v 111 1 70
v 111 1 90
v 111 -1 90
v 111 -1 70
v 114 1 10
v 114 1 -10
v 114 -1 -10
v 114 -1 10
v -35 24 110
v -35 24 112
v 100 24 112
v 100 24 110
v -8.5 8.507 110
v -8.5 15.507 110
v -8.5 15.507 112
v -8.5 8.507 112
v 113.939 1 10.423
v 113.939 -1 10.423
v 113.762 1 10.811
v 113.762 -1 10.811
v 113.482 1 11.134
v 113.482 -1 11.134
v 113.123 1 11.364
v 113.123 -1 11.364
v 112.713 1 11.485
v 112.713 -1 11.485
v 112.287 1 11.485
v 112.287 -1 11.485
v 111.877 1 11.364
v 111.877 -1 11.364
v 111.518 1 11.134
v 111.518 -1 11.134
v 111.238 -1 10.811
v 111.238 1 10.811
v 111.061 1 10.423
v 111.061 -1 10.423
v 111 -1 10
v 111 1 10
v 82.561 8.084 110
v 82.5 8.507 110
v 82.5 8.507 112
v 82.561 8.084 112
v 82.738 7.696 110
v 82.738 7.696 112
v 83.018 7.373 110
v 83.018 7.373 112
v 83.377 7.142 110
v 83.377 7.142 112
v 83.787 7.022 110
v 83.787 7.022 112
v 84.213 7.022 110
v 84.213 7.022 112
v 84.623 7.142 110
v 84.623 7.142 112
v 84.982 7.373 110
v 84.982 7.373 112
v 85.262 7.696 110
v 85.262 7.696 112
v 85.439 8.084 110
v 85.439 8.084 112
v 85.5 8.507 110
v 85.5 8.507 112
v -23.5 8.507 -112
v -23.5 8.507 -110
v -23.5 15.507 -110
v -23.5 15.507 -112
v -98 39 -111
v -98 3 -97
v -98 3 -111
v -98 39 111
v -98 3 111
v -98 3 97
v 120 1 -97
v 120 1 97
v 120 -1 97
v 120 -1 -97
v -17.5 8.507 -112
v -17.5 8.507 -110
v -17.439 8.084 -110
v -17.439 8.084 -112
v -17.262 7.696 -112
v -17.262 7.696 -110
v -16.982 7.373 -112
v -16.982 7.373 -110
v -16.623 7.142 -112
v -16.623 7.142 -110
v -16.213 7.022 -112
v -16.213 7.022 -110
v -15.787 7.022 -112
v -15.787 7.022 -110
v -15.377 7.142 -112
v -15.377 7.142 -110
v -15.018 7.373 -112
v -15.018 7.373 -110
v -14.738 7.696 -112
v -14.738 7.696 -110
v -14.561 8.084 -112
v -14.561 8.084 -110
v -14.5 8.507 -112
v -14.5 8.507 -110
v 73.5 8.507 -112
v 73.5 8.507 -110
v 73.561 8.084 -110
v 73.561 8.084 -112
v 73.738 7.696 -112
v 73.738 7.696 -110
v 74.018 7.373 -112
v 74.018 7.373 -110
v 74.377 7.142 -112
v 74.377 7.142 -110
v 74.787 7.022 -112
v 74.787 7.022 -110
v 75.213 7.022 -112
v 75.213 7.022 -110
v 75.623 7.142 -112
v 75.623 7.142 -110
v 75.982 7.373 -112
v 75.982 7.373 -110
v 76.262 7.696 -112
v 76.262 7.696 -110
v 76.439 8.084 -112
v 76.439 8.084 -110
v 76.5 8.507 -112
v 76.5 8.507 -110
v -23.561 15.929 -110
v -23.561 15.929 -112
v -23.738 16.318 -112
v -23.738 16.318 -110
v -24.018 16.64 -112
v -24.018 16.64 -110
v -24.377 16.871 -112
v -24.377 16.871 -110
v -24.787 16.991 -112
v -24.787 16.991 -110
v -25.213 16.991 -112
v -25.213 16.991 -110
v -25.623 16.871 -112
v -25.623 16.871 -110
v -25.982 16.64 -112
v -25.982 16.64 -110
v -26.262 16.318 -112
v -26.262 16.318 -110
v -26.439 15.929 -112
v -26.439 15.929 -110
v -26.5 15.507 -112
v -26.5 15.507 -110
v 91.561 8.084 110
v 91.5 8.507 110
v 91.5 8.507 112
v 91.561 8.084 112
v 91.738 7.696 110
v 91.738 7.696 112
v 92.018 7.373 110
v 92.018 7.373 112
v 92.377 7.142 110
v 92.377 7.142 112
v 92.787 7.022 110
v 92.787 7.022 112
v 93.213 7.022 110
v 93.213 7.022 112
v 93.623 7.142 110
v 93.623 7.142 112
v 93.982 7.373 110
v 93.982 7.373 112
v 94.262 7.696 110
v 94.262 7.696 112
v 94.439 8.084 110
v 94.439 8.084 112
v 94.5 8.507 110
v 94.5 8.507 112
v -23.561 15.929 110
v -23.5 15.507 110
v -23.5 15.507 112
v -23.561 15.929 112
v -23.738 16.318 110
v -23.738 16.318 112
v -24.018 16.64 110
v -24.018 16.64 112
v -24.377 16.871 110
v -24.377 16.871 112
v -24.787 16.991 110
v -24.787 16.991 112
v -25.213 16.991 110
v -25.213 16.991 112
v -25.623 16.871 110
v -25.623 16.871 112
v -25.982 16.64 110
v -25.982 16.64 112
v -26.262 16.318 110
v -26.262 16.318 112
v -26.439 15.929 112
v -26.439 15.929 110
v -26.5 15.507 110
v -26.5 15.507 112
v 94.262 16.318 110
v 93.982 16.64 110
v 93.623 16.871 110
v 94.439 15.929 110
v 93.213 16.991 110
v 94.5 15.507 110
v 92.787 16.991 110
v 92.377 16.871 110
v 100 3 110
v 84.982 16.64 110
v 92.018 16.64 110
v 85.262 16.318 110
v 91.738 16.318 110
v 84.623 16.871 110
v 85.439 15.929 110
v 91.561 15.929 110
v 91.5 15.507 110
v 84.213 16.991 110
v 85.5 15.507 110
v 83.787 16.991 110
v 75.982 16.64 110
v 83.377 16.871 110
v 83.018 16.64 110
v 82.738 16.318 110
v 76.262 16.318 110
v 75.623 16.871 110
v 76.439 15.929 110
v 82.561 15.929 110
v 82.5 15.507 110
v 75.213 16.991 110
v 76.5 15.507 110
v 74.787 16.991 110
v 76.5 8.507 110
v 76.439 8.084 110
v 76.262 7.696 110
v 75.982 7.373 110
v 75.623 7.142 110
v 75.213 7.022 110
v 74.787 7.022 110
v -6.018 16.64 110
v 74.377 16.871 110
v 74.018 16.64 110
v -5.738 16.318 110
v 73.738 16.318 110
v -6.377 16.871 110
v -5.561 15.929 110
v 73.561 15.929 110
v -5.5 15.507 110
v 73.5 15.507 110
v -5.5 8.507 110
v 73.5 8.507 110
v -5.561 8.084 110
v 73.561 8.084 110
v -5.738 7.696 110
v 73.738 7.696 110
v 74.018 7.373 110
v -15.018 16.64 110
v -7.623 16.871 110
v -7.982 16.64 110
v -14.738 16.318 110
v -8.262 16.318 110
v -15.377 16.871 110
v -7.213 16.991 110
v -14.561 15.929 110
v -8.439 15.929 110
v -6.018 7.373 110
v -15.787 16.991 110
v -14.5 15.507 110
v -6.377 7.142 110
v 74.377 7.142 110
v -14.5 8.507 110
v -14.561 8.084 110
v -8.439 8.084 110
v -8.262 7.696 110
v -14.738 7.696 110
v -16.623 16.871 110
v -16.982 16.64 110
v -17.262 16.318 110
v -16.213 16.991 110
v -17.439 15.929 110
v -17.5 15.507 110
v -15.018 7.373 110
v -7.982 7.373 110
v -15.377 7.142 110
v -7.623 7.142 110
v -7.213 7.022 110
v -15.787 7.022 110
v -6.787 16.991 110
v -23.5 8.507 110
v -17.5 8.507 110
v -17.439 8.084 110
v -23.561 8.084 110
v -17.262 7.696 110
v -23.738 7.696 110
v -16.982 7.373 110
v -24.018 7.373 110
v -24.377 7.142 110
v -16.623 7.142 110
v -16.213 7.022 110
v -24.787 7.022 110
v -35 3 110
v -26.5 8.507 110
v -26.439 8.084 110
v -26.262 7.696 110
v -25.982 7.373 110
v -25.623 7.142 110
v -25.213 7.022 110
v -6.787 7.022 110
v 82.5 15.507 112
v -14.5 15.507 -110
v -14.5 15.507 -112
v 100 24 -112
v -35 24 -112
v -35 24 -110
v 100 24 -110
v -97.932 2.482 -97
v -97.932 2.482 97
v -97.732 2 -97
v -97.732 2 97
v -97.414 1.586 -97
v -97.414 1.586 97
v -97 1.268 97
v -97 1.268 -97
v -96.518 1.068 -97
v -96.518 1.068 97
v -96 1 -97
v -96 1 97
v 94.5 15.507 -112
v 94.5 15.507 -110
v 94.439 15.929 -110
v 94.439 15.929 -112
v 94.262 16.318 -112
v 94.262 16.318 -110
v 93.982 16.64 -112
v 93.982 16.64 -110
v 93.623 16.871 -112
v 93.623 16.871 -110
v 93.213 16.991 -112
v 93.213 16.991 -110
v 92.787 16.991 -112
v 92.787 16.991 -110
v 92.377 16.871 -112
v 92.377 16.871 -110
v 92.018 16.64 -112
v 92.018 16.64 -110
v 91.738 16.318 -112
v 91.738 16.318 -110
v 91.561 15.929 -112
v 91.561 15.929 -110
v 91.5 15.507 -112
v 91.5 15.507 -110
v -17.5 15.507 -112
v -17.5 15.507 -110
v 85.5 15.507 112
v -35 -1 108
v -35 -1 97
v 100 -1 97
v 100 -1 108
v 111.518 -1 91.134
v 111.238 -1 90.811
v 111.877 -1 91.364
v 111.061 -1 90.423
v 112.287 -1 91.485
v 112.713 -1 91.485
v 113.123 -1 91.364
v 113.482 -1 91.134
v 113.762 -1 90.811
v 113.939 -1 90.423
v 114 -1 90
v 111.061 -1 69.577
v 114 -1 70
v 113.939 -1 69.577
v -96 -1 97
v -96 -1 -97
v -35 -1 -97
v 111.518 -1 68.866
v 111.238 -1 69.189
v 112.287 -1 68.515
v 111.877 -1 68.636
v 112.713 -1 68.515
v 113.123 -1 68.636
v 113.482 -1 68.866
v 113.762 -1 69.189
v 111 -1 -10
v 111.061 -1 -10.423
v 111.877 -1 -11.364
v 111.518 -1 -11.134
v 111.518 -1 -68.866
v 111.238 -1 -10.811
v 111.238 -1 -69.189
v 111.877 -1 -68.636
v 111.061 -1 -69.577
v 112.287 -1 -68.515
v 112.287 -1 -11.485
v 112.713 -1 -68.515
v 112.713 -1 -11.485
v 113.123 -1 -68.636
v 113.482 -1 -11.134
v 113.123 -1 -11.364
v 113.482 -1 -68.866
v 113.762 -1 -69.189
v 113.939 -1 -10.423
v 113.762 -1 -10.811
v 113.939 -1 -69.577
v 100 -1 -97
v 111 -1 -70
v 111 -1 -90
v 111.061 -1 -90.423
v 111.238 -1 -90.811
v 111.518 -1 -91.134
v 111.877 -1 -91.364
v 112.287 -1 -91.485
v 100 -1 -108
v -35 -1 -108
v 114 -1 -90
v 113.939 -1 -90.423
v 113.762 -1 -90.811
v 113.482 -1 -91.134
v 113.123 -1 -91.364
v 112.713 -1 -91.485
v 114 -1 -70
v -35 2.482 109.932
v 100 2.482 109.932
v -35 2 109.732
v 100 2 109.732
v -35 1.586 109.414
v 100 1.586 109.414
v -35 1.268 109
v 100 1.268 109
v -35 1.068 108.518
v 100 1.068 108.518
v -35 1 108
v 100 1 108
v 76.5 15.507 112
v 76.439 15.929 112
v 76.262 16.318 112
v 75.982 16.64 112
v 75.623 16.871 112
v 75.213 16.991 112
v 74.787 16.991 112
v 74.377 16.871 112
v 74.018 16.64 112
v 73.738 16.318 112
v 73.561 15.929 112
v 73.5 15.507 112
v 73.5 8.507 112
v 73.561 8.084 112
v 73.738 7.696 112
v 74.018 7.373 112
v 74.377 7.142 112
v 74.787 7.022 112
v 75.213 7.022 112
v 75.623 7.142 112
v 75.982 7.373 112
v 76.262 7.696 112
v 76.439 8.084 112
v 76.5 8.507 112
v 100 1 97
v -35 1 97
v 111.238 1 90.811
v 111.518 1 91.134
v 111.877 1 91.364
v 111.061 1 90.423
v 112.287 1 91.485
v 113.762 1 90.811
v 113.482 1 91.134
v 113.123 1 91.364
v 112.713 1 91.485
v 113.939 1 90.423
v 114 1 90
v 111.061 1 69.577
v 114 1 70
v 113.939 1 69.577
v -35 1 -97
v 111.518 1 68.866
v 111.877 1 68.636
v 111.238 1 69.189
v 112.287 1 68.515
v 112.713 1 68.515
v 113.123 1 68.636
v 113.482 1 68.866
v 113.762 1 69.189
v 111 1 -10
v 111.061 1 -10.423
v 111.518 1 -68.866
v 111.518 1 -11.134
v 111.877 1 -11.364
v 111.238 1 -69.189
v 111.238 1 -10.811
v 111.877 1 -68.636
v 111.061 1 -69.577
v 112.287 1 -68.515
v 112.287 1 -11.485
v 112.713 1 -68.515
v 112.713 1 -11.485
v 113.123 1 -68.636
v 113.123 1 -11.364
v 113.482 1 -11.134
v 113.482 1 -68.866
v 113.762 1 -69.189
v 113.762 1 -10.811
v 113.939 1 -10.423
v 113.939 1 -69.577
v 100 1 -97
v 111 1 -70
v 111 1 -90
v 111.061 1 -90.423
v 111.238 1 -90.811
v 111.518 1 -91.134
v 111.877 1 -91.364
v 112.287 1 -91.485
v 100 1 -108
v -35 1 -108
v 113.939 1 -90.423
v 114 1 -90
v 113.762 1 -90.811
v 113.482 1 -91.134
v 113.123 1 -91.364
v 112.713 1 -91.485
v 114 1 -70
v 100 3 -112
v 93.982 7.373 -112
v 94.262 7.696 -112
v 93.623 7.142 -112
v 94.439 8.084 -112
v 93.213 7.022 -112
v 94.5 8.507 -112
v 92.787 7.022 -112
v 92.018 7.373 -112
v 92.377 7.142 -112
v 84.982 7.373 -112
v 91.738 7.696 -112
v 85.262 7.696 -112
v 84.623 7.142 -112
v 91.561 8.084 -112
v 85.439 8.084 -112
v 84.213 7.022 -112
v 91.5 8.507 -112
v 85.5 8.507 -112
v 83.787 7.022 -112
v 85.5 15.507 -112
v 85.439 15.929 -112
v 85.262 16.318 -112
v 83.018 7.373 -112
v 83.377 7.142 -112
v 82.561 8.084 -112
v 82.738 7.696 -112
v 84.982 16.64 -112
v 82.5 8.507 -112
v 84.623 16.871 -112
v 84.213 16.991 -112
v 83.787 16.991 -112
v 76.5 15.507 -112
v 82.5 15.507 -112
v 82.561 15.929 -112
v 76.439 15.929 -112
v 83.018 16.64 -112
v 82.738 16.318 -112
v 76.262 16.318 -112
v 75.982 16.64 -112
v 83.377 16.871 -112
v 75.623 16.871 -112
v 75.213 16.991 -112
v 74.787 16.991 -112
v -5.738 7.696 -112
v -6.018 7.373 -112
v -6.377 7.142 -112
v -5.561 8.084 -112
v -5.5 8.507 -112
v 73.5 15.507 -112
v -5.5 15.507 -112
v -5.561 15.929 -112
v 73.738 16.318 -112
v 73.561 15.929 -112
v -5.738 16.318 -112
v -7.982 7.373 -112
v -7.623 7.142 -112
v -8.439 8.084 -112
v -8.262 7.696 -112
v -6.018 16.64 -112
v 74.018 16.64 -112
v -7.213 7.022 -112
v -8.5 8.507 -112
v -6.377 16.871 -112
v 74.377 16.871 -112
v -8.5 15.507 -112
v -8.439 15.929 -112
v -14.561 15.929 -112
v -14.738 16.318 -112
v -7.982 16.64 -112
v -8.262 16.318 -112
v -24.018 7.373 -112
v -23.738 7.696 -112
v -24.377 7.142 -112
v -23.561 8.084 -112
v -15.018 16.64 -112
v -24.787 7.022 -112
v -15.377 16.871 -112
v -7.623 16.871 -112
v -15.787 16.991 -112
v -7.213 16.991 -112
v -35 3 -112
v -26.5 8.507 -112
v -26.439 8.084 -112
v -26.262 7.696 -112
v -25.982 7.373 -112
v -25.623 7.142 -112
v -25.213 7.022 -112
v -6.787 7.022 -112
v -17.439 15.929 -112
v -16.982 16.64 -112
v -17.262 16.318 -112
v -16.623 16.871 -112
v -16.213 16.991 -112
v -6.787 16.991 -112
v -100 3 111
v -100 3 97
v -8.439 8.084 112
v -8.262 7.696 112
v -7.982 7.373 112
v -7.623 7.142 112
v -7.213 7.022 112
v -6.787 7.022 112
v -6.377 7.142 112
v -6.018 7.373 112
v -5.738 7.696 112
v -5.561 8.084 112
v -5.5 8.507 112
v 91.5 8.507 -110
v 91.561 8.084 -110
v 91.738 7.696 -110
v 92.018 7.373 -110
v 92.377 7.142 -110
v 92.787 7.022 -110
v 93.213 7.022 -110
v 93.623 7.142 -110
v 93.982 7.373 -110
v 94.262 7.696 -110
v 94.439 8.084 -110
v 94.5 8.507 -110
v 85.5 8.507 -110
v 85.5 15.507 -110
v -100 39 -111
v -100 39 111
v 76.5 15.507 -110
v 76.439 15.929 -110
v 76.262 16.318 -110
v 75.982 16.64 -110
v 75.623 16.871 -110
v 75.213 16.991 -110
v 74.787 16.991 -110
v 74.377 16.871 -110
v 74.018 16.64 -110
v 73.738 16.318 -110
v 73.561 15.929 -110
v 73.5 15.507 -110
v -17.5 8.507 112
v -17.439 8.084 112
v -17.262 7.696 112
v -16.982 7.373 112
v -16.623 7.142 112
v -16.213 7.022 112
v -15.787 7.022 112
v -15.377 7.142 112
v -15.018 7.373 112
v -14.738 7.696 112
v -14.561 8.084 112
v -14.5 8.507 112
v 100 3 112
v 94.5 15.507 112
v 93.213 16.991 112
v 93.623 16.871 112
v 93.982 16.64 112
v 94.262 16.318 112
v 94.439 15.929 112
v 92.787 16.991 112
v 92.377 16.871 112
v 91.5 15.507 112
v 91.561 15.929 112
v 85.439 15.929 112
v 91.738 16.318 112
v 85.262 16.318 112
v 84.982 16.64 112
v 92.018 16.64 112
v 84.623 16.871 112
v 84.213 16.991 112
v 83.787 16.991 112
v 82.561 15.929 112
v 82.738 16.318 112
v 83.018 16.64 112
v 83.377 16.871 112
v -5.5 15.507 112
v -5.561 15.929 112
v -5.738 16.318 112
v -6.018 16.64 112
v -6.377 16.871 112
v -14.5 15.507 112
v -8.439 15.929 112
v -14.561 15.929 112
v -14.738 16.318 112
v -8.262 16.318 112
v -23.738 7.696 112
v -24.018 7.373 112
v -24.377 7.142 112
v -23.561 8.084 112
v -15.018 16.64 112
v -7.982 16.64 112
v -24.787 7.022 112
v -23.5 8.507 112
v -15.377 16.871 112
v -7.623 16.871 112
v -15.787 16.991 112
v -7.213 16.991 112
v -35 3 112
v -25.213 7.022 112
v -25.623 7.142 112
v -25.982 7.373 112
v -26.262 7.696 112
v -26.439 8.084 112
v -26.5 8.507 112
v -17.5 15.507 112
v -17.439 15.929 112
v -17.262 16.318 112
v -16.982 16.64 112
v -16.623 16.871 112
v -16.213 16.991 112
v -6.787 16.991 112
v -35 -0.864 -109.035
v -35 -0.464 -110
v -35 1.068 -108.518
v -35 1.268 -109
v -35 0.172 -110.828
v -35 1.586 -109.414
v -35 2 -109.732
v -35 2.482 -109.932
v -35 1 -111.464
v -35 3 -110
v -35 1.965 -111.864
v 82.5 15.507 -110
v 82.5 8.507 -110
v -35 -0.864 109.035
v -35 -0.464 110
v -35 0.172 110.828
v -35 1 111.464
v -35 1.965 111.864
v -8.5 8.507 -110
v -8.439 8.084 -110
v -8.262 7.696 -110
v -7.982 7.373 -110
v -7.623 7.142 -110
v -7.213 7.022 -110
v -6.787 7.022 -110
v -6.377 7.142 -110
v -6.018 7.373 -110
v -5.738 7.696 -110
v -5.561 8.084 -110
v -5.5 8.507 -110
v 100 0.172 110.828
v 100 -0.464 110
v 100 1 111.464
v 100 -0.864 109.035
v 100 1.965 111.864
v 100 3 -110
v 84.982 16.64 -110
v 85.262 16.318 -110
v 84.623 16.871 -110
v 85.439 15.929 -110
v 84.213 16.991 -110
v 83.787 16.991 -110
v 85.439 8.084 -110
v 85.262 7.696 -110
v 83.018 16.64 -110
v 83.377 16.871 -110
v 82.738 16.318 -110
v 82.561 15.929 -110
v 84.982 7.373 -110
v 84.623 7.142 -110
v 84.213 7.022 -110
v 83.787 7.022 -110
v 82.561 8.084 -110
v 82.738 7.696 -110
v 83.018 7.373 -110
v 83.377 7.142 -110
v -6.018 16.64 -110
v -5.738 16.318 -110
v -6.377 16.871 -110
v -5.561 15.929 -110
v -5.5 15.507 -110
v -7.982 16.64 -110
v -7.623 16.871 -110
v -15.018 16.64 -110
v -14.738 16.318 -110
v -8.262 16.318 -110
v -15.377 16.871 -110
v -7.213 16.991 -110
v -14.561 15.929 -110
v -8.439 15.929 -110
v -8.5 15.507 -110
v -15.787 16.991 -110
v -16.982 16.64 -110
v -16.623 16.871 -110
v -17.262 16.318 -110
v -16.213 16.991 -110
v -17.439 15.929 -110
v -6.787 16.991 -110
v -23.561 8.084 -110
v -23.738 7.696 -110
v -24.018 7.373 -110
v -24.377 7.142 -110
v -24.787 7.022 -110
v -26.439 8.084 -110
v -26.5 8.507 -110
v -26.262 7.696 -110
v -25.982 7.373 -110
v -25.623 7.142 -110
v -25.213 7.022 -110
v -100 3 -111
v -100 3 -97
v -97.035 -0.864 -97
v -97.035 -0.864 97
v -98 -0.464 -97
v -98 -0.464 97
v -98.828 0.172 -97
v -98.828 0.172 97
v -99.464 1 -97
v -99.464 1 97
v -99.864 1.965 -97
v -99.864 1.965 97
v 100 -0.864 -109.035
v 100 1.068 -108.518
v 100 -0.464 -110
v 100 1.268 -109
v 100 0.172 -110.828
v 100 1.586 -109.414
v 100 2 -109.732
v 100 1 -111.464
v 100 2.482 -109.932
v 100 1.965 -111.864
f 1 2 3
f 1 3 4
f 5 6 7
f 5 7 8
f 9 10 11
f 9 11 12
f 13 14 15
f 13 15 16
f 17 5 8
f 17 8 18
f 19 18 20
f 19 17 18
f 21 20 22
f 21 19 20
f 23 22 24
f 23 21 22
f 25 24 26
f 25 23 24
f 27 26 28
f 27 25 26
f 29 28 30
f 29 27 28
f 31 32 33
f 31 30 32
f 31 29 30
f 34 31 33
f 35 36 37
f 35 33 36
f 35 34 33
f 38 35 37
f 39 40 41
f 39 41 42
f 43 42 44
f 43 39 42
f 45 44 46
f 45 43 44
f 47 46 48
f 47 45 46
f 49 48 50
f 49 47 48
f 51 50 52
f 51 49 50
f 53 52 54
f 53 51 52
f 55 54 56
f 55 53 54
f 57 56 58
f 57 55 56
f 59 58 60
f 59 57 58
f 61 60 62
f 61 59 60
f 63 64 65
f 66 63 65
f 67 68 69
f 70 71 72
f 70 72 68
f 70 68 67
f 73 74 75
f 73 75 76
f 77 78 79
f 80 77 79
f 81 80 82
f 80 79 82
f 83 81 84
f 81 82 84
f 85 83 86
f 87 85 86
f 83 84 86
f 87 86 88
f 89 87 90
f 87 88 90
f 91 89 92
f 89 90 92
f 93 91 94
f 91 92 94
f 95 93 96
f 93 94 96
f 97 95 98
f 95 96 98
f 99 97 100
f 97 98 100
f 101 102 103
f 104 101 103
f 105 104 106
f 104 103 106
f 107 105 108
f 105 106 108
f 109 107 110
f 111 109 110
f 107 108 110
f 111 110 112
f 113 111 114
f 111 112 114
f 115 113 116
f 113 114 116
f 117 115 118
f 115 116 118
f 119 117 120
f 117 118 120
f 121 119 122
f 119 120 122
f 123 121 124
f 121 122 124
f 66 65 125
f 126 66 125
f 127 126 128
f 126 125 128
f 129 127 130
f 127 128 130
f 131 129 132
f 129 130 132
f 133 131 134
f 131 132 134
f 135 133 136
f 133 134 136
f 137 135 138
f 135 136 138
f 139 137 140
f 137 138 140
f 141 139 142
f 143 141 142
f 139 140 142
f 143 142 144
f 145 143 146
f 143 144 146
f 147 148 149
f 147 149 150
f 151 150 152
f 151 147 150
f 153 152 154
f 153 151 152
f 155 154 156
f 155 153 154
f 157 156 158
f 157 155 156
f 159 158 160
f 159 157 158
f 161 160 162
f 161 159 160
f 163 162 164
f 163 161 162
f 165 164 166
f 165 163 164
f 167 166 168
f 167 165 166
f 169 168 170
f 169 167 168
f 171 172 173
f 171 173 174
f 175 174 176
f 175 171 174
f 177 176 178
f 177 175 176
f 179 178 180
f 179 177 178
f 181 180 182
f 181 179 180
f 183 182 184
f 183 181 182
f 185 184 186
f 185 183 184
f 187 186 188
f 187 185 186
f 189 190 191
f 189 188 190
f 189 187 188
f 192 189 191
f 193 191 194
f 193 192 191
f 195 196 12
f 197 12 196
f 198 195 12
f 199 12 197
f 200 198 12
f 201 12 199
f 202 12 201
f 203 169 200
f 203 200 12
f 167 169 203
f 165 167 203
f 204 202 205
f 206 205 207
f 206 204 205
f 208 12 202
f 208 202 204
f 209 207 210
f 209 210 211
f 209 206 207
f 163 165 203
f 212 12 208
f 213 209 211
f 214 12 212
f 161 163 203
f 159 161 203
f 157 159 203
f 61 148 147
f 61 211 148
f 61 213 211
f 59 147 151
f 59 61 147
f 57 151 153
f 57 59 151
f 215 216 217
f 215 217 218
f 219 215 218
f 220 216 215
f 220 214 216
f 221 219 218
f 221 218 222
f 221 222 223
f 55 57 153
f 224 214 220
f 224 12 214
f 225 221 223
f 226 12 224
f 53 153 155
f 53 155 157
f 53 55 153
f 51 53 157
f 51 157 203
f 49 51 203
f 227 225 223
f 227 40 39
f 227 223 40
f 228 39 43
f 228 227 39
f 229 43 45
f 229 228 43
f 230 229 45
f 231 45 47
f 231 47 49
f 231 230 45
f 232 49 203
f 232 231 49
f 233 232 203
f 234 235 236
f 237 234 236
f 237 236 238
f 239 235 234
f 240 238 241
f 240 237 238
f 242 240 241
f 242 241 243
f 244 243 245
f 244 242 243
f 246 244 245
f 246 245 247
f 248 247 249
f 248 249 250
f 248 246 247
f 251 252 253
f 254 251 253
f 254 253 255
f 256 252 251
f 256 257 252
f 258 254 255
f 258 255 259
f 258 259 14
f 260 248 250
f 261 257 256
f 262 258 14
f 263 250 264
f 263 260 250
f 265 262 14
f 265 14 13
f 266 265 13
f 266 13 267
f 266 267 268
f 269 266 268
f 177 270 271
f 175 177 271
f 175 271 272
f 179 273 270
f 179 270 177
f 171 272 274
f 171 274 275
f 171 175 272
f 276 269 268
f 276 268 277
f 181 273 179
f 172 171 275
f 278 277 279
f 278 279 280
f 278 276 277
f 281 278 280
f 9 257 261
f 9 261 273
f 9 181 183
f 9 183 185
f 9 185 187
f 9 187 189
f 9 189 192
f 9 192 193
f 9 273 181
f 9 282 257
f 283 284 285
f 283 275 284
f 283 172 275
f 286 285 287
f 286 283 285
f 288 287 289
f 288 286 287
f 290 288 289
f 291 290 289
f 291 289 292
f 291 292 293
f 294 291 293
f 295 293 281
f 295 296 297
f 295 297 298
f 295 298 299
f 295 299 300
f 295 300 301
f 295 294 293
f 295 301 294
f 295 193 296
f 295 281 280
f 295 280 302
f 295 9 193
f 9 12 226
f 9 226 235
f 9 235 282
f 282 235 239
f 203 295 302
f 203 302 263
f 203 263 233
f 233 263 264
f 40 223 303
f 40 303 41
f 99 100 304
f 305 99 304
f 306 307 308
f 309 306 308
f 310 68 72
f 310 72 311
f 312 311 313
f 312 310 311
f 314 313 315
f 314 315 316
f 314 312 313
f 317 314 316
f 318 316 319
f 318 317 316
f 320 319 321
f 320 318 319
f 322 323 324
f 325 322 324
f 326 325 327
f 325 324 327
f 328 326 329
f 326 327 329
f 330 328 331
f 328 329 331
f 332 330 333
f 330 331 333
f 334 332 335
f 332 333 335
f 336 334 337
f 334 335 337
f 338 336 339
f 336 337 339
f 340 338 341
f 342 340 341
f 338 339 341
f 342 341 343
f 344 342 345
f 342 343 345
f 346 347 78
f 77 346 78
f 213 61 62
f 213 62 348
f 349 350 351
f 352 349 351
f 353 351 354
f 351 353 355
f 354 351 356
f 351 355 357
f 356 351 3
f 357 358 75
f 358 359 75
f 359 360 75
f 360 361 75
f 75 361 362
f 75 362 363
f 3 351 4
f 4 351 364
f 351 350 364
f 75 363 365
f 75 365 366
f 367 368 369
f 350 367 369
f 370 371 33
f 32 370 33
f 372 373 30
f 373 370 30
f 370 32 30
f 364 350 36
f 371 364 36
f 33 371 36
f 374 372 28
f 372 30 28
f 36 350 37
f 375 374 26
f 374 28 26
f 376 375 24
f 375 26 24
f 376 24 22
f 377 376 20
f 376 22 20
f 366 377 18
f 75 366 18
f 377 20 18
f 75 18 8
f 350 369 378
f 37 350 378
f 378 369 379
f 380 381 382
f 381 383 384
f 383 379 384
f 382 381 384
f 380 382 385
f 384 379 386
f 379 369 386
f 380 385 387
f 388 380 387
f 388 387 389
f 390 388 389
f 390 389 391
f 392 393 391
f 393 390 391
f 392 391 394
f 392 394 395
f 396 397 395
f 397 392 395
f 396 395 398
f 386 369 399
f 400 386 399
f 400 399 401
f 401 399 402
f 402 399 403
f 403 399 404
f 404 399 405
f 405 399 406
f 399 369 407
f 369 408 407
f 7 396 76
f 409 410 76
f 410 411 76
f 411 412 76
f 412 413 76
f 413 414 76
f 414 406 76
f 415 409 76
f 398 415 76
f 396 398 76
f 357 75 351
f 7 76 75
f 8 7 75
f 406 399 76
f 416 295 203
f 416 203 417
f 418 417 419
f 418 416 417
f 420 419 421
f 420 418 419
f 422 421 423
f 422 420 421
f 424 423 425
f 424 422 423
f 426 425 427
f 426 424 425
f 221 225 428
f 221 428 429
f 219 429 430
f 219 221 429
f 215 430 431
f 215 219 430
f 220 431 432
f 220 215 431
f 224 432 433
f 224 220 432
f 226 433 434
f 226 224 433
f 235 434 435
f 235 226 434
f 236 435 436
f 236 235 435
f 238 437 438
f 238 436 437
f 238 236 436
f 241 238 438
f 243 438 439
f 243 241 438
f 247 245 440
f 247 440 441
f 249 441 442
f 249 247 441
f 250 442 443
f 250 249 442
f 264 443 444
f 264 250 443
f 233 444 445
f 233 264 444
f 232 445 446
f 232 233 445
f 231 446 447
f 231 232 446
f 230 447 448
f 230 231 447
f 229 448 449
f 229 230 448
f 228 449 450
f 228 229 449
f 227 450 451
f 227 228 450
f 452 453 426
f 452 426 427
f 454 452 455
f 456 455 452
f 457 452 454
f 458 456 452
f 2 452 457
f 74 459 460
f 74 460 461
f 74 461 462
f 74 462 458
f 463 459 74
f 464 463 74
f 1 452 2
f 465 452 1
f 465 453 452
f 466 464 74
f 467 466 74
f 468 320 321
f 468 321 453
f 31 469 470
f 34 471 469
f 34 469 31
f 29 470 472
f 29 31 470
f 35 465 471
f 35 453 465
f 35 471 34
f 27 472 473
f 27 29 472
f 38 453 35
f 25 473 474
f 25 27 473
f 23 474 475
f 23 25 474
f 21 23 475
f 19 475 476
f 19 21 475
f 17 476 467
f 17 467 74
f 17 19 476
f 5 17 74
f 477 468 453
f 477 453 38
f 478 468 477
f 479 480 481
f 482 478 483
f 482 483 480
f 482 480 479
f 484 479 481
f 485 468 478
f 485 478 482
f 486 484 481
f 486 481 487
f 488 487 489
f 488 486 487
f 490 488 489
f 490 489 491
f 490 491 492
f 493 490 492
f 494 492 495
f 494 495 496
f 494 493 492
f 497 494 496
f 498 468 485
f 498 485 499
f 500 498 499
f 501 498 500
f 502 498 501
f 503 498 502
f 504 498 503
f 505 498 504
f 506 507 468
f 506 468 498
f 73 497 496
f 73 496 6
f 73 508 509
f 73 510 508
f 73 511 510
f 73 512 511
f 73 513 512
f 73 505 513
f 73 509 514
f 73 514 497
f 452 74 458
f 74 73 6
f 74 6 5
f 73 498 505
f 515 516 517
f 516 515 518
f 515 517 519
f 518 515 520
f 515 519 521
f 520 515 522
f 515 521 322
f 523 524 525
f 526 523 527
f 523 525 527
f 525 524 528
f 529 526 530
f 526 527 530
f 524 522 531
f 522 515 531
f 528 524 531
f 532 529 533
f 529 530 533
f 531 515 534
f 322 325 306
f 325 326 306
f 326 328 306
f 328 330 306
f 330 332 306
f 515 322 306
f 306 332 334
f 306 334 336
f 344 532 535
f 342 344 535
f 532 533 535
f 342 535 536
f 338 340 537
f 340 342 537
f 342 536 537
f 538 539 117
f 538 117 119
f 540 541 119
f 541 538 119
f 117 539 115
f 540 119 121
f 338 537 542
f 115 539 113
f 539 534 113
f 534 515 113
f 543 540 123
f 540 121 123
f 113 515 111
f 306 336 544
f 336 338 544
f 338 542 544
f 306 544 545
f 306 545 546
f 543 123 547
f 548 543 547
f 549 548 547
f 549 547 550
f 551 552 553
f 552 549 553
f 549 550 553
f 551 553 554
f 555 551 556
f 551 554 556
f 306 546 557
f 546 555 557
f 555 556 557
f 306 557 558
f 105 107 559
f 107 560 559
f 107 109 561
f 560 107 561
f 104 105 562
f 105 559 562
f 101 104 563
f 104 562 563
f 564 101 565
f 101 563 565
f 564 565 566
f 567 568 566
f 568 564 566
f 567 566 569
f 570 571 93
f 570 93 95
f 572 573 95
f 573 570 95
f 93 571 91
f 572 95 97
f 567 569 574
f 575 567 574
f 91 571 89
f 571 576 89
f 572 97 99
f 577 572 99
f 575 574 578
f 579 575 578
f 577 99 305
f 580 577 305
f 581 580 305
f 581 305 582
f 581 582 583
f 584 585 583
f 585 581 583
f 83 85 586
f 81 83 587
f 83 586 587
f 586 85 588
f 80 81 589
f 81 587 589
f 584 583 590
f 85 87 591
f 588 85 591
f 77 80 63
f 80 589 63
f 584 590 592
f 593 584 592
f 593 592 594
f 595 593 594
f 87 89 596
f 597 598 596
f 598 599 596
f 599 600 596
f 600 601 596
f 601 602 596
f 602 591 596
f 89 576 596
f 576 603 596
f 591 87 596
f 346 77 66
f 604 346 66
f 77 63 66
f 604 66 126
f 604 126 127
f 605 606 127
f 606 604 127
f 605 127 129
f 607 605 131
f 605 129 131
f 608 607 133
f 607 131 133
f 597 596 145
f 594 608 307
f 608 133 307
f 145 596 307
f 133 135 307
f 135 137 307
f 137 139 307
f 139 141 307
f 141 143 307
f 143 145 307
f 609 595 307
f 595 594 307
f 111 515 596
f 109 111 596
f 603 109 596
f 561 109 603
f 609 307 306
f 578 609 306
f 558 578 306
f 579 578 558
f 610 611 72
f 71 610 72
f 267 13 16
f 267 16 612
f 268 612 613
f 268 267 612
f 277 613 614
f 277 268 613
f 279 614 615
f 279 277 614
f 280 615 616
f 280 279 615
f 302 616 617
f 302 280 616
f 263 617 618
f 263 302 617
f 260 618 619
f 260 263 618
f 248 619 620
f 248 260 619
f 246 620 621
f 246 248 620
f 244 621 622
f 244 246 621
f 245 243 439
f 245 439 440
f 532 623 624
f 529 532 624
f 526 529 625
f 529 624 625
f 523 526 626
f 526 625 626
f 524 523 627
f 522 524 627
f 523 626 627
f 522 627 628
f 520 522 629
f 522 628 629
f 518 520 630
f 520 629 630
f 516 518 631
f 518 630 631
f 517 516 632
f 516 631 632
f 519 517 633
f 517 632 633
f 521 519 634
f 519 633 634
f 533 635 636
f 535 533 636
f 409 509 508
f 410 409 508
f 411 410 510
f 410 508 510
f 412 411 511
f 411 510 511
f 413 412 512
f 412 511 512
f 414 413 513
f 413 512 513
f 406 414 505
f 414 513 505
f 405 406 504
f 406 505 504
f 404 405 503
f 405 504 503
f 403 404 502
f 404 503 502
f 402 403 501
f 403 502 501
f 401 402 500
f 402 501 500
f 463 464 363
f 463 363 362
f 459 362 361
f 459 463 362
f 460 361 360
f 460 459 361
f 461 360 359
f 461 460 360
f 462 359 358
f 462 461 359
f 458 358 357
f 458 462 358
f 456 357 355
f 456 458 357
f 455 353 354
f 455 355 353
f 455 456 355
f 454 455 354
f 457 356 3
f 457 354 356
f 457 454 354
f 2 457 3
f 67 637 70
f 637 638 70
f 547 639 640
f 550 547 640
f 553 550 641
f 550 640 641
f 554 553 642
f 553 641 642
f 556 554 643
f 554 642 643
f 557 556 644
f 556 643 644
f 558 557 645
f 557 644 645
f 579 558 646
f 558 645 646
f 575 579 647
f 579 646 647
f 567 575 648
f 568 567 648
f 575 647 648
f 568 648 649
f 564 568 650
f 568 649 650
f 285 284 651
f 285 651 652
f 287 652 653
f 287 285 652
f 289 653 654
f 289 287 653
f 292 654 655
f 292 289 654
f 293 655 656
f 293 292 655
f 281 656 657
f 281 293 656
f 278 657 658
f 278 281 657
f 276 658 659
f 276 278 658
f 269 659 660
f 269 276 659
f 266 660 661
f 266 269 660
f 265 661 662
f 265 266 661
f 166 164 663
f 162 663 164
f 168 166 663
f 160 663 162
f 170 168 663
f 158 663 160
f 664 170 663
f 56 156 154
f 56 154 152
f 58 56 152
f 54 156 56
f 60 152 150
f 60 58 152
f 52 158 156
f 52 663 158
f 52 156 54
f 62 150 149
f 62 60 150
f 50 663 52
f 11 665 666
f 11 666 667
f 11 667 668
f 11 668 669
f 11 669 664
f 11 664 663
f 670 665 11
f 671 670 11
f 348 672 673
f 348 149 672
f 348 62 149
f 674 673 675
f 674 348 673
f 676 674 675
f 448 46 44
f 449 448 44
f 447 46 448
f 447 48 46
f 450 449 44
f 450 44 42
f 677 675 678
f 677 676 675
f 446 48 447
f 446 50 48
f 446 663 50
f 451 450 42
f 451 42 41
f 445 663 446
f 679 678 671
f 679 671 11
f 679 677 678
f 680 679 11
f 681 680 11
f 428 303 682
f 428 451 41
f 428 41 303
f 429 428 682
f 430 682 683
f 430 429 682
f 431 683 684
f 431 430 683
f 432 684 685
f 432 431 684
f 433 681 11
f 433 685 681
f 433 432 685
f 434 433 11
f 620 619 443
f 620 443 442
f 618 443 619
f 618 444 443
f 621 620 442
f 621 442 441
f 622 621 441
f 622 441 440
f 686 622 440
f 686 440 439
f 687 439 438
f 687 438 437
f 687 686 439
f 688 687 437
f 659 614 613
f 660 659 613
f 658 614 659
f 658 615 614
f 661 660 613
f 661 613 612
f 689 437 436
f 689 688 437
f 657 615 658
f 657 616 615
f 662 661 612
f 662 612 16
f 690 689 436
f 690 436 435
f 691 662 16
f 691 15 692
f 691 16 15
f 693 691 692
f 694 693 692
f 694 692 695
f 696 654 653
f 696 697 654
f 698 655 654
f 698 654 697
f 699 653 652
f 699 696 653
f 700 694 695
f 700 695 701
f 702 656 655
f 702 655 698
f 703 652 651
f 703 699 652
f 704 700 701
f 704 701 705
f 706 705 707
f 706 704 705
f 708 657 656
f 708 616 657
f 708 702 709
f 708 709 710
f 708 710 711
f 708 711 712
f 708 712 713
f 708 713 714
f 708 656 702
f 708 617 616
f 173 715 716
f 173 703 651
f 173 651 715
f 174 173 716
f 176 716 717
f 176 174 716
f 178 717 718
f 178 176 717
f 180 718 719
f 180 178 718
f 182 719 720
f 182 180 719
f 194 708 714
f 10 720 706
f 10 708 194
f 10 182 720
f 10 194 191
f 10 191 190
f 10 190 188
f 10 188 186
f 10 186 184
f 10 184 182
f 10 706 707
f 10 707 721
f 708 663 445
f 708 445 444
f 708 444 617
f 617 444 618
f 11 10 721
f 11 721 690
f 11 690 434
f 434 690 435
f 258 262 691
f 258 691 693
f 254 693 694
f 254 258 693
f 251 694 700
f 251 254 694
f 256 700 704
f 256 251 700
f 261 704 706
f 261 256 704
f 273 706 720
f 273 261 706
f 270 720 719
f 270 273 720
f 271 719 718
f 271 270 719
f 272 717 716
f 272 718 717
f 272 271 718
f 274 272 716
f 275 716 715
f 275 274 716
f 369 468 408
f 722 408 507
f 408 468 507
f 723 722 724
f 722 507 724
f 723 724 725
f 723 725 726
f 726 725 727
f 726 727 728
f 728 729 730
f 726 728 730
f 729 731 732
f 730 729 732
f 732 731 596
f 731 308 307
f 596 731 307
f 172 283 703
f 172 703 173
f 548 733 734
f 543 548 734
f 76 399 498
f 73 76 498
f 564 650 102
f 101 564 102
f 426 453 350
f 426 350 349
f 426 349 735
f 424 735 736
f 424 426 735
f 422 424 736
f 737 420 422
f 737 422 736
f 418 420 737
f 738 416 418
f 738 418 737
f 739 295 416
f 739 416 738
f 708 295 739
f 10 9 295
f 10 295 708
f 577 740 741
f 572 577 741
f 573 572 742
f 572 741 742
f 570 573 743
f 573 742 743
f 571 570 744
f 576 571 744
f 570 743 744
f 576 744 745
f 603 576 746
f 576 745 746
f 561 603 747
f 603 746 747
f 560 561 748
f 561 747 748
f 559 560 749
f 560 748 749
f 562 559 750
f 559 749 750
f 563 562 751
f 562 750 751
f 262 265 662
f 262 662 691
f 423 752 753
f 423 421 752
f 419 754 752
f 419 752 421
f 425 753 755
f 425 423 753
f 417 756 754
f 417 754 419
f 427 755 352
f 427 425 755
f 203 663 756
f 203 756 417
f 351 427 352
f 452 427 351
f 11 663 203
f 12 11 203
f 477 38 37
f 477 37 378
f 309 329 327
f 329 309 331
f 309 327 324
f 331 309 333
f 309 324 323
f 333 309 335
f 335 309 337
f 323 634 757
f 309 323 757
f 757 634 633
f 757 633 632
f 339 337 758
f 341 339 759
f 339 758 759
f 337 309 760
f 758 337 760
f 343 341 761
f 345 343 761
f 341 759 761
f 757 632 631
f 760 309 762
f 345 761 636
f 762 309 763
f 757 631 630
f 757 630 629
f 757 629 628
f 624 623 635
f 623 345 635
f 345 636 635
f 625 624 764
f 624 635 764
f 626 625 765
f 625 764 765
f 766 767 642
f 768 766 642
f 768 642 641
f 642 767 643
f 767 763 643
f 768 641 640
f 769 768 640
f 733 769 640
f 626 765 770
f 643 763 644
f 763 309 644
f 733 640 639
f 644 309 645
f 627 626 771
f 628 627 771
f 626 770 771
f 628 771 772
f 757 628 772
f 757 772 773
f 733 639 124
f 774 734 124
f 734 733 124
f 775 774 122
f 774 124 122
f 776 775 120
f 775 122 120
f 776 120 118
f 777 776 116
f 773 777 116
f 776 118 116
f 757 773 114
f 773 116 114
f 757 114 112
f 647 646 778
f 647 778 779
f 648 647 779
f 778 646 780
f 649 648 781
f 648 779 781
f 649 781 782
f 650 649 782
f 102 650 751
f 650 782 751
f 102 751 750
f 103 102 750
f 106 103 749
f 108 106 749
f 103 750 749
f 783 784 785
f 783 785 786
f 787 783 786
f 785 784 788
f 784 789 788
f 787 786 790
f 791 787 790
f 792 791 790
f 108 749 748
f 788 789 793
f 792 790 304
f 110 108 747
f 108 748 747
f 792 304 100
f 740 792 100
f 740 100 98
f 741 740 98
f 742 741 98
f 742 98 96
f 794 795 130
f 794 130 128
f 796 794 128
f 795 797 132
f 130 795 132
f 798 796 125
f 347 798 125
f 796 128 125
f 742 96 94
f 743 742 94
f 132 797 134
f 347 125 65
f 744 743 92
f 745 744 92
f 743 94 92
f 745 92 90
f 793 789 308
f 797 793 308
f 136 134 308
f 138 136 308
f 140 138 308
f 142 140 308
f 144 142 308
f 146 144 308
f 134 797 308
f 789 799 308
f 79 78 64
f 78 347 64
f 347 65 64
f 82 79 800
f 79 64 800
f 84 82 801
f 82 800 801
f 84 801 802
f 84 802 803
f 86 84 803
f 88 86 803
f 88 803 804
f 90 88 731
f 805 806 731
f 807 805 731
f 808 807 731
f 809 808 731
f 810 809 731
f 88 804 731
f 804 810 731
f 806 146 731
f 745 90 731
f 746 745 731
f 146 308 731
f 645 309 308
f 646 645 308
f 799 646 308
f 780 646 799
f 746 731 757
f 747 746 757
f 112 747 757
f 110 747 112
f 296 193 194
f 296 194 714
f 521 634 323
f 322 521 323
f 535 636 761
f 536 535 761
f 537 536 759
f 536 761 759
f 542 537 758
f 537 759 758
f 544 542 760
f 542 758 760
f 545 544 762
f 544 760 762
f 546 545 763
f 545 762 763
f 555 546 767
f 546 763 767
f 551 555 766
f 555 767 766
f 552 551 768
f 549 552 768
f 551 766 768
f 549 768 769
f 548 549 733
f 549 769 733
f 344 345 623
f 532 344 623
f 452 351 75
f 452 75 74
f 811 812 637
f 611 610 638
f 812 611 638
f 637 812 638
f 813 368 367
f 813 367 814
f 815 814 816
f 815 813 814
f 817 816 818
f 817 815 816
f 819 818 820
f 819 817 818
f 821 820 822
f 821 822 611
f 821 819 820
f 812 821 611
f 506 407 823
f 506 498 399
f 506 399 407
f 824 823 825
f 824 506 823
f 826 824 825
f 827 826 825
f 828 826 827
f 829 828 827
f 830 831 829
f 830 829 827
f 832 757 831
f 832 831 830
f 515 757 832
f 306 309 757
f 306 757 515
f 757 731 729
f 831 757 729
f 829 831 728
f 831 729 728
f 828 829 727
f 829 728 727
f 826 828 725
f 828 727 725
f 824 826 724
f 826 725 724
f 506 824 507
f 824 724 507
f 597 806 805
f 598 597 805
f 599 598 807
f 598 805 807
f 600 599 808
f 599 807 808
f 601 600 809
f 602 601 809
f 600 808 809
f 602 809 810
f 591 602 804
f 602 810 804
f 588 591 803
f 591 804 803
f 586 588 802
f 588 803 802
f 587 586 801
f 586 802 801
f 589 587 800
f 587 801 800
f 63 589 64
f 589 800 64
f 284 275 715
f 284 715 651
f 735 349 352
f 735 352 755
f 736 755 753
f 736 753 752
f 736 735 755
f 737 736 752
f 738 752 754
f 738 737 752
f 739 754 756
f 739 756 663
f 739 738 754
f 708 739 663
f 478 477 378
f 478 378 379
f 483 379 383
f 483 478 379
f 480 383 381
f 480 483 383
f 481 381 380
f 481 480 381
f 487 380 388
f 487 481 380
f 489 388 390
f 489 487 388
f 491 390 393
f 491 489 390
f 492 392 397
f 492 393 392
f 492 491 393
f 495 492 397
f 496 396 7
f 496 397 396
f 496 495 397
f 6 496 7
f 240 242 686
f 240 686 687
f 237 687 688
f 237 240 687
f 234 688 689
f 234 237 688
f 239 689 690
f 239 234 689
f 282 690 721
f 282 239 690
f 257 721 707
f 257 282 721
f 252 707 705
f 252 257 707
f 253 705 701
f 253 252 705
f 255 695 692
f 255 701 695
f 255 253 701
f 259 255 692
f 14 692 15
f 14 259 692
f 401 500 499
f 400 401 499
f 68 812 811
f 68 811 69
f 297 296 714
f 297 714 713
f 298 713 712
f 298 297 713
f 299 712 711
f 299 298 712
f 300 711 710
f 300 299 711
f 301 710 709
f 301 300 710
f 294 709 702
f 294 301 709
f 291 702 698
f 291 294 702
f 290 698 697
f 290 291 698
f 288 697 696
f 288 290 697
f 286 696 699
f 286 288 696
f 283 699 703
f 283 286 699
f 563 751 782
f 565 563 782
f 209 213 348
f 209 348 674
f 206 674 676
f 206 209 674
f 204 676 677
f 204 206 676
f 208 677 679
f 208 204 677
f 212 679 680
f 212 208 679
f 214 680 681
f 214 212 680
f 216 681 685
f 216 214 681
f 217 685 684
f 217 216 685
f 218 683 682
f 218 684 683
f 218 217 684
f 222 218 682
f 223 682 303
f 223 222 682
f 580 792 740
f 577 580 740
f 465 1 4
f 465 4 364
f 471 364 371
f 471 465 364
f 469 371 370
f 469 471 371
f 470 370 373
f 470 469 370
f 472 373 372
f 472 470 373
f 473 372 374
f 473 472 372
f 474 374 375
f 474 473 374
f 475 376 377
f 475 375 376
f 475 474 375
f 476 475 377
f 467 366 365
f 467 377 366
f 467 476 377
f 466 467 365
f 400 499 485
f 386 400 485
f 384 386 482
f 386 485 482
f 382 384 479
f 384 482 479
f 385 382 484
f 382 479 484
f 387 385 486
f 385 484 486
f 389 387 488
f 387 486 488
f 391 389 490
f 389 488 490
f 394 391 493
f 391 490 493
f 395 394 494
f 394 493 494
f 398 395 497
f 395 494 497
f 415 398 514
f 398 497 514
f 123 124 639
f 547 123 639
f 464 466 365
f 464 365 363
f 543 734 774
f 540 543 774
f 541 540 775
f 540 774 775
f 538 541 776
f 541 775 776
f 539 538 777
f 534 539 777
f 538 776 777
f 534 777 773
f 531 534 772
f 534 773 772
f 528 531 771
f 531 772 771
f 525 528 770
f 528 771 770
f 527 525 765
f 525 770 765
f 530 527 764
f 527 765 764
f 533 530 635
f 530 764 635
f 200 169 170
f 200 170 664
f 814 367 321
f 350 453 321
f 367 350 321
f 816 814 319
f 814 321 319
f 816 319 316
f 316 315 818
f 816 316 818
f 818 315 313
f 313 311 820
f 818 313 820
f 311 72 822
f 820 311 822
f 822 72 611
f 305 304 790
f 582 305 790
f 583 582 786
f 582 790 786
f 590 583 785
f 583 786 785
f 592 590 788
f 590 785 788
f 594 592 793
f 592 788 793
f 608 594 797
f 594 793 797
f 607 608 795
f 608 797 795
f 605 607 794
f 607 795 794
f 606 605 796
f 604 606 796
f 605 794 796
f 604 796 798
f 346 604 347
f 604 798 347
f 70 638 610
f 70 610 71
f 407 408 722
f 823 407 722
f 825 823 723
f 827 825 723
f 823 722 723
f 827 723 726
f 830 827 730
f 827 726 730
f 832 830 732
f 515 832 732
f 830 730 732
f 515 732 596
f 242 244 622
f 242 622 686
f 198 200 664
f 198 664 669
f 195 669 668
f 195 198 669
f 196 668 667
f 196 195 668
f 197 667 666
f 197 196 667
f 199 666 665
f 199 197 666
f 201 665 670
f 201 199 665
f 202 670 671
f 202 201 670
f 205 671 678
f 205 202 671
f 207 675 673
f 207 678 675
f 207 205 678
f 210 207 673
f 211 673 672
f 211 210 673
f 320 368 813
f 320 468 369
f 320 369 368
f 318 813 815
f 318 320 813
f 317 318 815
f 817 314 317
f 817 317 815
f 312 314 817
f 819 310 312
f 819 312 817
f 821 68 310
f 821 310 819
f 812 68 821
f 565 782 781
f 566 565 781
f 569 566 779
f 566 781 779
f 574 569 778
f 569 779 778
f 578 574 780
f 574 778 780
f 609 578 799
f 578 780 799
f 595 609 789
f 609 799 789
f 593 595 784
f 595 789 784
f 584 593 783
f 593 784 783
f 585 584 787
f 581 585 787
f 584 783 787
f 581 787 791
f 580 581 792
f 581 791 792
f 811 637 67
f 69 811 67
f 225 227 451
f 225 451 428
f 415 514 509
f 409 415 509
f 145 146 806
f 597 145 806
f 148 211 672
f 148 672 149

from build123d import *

# Parameters (mm, degrees)
SKETCH1_W                    = 200
SKETCH1_H                    = 224
BOSS_EXTRUDE1_DEPTH          = 1
SKETCH41_W                   = 65
SKETCH41_H                   = 15
CUT_EXTRUDE2_DEPTH           = 40
EDGE_FLANGE1_STRIP_W         = 12
EDGE_FLANGE1_STRIP_H         = 2
EDGE_FLANGE1_STRIP_CUT_DEPTH = 135
EDGE_FLANGE1_DEPTH           = 135
SKETCH53_W                   = 194
SKETCH53_H                   = 2
BOSS_EXTRUDE2_DEPTH          = 20
CUT_EXTRUDE3_DEPTH           = 20
EDGE_FLANGE3_STRIP_W         = 12
EDGE_FLANGE3_STRIP_H         = 2
EDGE_FLANGE3_STRIP_CUT_DEPTH = 194
EDGE_FLANGE3_DEPTH           = 194
SKETCH58_W                   = 2
SKETCH58_H                   = 36
BOSS_EXTRUDE3_DEPTH          = 14
CUT_EXTRUDE4_DEPTH           = 10


# Sheet-metal steps are written as plain solids
with BuildPart() as part:
    # Sketch1 → Boss-Extrude1 (new, symmetric)
    with BuildSketch(Plane(origin=(0, 0, 0), x_dir=(1, 0, 0), z_dir=(0, 1, 0))):
        Rectangle(SKETCH1_W, SKETCH1_H)
    extrude(amount=BOSS_EXTRUDE1_DEPTH, both=True)

    # Sketch41 → Cut-Extrude2 (cut)
    with BuildSketch(Plane(origin=(0, 1, 0), x_dir=(1, 0, 0), z_dir=(0, 1, 0))):
        with Locations((-67.5, -104.5)):
            Rectangle(SKETCH41_W, SKETCH41_H)
        with Locations((-67.5, 104.5)):
            Rectangle(SKETCH41_W, SKETCH41_H)
    extrude(amount=-CUT_EXTRUDE2_DEPTH, mode=Mode.SUBTRACT)

    # Edge-Flange1 strip (across the edge) → Edge-Flange1 strip cut (cut)
    with BuildSketch(Plane(origin=(-35, 1, 112), x_dir=(0, 0, -1), z_dir=(1, 0, 0))):
        with Locations((-2, -1)):
            Rectangle(EDGE_FLANGE1_STRIP_W, EDGE_FLANGE1_STRIP_H)
    edge_flange1_strip_cut = extrude(amount=EDGE_FLANGE1_STRIP_CUT_DEPTH, mode=Mode.SUBTRACT)

    # Edge-Flange1 section (across the edge) → Edge-Flange1 (add)
    with BuildSketch(Plane(origin=(-35, 1, 112), x_dir=(0, 0, -1), z_dir=(1, 0, 0))):
        with BuildLine():
            Line((0, 2), (0, 23))
            Line((0, 23), (2, 23))
            Line((2, 23), (2, 2))
            ThreePointArc((2, 2), (2.585786438, 0.585786438), (4, 0))
            Line((4, 0), (4, -2))
            ThreePointArc((4, -2), (1.171572875, -0.828427125), (0, 2))
        make_face()
    edge_flange1 = extrude(amount=EDGE_FLANGE1_DEPTH)

    # Mirror1: Edge-Flange1 strip cut, Edge-Flange1 across plane
    add(edge_flange1_strip_cut.mirror(Plane.XY), mode=Mode.SUBTRACT)
    add(edge_flange1.mirror(Plane.XY))

    # Sketch53 → Boss-Extrude2 (add)
    with BuildSketch(Plane(origin=(100, 0, 0), x_dir=(0, 0, -1), z_dir=(1, 0, 0))):
        Rectangle(SKETCH53_W, SKETCH53_H)
    extrude(amount=BOSS_EXTRUDE2_DEPTH)

    # Sketch54 → Cut-Extrude3 (cut)
    with BuildSketch(Plane(origin=(0, 0, 110), x_dir=(-1, 0, 0), z_dir=(0, 0, -1))):
        with BuildLine():
            Line((-94.5, 8.506539698), (-94.5, 15.506539698))
            ThreePointArc((-94.5, 15.506539698), (-93, 17.006539698), (-91.5, 15.506539698))
            Line((-91.5, 15.506539698), (-91.5, 8.506539698))
            ThreePointArc((-91.5, 8.506539698), (-93, 7.006539698), (-94.5, 8.506539698))
        make_face()
        with BuildLine():
            Line((-85.5, 8.506539698), (-85.5, 15.506539698))
            ThreePointArc((-85.5, 15.506539698), (-84, 17.006539698), (-82.5, 15.506539698))
            Line((-82.5, 15.506539698), (-82.5, 8.506539698))
            ThreePointArc((-82.5, 8.506539698), (-84, 7.006539698), (-85.5, 8.506539698))
        make_face()
        with BuildLine():
            Line((-76.5, 8.506539698), (-76.5, 15.506539698))
            ThreePointArc((-76.5, 15.506539698), (-75, 17.006539698), (-73.5, 15.506539698))
            Line((-73.5, 15.506539698), (-73.5, 8.506539698))
            ThreePointArc((-73.5, 8.506539698), (-75, 7.006539698), (-76.5, 8.506539698))
        make_face()
        with BuildLine():
            Line((14.5, 8.506539698), (14.5, 15.506539698))
            ThreePointArc((14.5, 15.506539698), (16, 17.006539698), (17.5, 15.506539698))
            Line((17.5, 15.506539698), (17.5, 8.506539698))
            ThreePointArc((17.5, 8.506539698), (16, 7.006539698), (14.5, 8.506539698))
        make_face()
        with BuildLine():
            Line((5.5, 8.506539698), (5.5, 15.506539698))
            ThreePointArc((5.5, 15.506539698), (7, 17.006539698), (8.5, 15.506539698))
            Line((8.5, 15.506539698), (8.5, 8.506539698))
            ThreePointArc((8.5, 8.506539698), (7, 7.006539698), (5.5, 8.506539698))
        make_face()
        with BuildLine():
            Line((23.5, 8.506539698), (23.5, 15.506539698))
            ThreePointArc((23.5, 15.506539698), (25, 17.006539698), (26.5, 15.506539698))
            Line((26.5, 15.506539698), (26.5, 8.506539698))
            ThreePointArc((26.5, 8.506539698), (25, 7.006539698), (23.5, 8.506539698))
        make_face()
    cut_extrude3 = extrude(amount=-CUT_EXTRUDE3_DEPTH, mode=Mode.SUBTRACT)

    # Edge-Flange3 strip (across the edge) → Edge-Flange3 strip cut (cut)
    with BuildSketch(Plane(origin=(-100, 1, -97), x_dir=(1, 0, 0), z_dir=(0, 0, 1))):
        with Locations((-2, -1)):
            Rectangle(EDGE_FLANGE3_STRIP_W, EDGE_FLANGE3_STRIP_H)
    extrude(amount=EDGE_FLANGE3_STRIP_CUT_DEPTH, mode=Mode.SUBTRACT)

    # Edge-Flange3 section (across the edge) → Edge-Flange3 (add)
    with BuildSketch(Plane(origin=(-100, 1, -97), x_dir=(1, 0, 0), z_dir=(0, 0, 1))):
        with BuildLine():
            Line((0, 2), (0, 38))
            Line((0, 38), (2, 38))
            Line((2, 38), (2, 2))
            ThreePointArc((2, 2), (2.585786438, 0.585786438), (4, 0))
            Line((4, 0), (4, -2))
            ThreePointArc((4, -2), (1.171572875, -0.828427125), (0, 2))
        make_face()
    extrude(amount=EDGE_FLANGE3_DEPTH)

    # Sketch58 → Boss-Extrude3 (add)
    with BuildSketch(Plane.XY.offset(97)):
        with Locations((-99, 21)):
            Rectangle(SKETCH58_W, SKETCH58_H)
    boss_extrude3 = extrude(amount=BOSS_EXTRUDE3_DEPTH)

    # Mirror2: Cut-Extrude3, Boss-Extrude3 across plane
    add(cut_extrude3.mirror(Plane.XY), mode=Mode.SUBTRACT)
    add(boss_extrude3.mirror(Plane.XY))

    # Sketch59 → Cut-Extrude4 (cut)
    with BuildSketch(Plane(origin=(0, 1, 0), x_dir=(1, 0, 0), z_dir=(0, 1, 0))):
        with BuildLine():
            Line((111, -90), (111, -70))
            ThreePointArc((111, -70), (112.5, -68.5), (114, -70))
            Line((114, -70), (114, -90))
            ThreePointArc((114, -90), (112.5, -91.5), (111, -90))
        make_face()
        with BuildLine():
            Line((111, -10), (111, 10))
            ThreePointArc((111, 10), (112.5, 11.5), (114, 10))
            Line((114, 10), (114, -10))
            ThreePointArc((114, -10), (112.5, -11.5), (111, -10))
        make_face()
        with BuildLine():
            Line((111, 90), (111, 70))
            ThreePointArc((111, 70), (112.5, 68.5), (114, 70))
            Line((114, 70), (114, 90))
            ThreePointArc((114, 90), (112.5, 91.5), (111, 90))
        make_face()
    extrude(amount=-CUT_EXTRUDE4_DEPTH, mode=Mode.SUBTRACT)


solid = part.part
